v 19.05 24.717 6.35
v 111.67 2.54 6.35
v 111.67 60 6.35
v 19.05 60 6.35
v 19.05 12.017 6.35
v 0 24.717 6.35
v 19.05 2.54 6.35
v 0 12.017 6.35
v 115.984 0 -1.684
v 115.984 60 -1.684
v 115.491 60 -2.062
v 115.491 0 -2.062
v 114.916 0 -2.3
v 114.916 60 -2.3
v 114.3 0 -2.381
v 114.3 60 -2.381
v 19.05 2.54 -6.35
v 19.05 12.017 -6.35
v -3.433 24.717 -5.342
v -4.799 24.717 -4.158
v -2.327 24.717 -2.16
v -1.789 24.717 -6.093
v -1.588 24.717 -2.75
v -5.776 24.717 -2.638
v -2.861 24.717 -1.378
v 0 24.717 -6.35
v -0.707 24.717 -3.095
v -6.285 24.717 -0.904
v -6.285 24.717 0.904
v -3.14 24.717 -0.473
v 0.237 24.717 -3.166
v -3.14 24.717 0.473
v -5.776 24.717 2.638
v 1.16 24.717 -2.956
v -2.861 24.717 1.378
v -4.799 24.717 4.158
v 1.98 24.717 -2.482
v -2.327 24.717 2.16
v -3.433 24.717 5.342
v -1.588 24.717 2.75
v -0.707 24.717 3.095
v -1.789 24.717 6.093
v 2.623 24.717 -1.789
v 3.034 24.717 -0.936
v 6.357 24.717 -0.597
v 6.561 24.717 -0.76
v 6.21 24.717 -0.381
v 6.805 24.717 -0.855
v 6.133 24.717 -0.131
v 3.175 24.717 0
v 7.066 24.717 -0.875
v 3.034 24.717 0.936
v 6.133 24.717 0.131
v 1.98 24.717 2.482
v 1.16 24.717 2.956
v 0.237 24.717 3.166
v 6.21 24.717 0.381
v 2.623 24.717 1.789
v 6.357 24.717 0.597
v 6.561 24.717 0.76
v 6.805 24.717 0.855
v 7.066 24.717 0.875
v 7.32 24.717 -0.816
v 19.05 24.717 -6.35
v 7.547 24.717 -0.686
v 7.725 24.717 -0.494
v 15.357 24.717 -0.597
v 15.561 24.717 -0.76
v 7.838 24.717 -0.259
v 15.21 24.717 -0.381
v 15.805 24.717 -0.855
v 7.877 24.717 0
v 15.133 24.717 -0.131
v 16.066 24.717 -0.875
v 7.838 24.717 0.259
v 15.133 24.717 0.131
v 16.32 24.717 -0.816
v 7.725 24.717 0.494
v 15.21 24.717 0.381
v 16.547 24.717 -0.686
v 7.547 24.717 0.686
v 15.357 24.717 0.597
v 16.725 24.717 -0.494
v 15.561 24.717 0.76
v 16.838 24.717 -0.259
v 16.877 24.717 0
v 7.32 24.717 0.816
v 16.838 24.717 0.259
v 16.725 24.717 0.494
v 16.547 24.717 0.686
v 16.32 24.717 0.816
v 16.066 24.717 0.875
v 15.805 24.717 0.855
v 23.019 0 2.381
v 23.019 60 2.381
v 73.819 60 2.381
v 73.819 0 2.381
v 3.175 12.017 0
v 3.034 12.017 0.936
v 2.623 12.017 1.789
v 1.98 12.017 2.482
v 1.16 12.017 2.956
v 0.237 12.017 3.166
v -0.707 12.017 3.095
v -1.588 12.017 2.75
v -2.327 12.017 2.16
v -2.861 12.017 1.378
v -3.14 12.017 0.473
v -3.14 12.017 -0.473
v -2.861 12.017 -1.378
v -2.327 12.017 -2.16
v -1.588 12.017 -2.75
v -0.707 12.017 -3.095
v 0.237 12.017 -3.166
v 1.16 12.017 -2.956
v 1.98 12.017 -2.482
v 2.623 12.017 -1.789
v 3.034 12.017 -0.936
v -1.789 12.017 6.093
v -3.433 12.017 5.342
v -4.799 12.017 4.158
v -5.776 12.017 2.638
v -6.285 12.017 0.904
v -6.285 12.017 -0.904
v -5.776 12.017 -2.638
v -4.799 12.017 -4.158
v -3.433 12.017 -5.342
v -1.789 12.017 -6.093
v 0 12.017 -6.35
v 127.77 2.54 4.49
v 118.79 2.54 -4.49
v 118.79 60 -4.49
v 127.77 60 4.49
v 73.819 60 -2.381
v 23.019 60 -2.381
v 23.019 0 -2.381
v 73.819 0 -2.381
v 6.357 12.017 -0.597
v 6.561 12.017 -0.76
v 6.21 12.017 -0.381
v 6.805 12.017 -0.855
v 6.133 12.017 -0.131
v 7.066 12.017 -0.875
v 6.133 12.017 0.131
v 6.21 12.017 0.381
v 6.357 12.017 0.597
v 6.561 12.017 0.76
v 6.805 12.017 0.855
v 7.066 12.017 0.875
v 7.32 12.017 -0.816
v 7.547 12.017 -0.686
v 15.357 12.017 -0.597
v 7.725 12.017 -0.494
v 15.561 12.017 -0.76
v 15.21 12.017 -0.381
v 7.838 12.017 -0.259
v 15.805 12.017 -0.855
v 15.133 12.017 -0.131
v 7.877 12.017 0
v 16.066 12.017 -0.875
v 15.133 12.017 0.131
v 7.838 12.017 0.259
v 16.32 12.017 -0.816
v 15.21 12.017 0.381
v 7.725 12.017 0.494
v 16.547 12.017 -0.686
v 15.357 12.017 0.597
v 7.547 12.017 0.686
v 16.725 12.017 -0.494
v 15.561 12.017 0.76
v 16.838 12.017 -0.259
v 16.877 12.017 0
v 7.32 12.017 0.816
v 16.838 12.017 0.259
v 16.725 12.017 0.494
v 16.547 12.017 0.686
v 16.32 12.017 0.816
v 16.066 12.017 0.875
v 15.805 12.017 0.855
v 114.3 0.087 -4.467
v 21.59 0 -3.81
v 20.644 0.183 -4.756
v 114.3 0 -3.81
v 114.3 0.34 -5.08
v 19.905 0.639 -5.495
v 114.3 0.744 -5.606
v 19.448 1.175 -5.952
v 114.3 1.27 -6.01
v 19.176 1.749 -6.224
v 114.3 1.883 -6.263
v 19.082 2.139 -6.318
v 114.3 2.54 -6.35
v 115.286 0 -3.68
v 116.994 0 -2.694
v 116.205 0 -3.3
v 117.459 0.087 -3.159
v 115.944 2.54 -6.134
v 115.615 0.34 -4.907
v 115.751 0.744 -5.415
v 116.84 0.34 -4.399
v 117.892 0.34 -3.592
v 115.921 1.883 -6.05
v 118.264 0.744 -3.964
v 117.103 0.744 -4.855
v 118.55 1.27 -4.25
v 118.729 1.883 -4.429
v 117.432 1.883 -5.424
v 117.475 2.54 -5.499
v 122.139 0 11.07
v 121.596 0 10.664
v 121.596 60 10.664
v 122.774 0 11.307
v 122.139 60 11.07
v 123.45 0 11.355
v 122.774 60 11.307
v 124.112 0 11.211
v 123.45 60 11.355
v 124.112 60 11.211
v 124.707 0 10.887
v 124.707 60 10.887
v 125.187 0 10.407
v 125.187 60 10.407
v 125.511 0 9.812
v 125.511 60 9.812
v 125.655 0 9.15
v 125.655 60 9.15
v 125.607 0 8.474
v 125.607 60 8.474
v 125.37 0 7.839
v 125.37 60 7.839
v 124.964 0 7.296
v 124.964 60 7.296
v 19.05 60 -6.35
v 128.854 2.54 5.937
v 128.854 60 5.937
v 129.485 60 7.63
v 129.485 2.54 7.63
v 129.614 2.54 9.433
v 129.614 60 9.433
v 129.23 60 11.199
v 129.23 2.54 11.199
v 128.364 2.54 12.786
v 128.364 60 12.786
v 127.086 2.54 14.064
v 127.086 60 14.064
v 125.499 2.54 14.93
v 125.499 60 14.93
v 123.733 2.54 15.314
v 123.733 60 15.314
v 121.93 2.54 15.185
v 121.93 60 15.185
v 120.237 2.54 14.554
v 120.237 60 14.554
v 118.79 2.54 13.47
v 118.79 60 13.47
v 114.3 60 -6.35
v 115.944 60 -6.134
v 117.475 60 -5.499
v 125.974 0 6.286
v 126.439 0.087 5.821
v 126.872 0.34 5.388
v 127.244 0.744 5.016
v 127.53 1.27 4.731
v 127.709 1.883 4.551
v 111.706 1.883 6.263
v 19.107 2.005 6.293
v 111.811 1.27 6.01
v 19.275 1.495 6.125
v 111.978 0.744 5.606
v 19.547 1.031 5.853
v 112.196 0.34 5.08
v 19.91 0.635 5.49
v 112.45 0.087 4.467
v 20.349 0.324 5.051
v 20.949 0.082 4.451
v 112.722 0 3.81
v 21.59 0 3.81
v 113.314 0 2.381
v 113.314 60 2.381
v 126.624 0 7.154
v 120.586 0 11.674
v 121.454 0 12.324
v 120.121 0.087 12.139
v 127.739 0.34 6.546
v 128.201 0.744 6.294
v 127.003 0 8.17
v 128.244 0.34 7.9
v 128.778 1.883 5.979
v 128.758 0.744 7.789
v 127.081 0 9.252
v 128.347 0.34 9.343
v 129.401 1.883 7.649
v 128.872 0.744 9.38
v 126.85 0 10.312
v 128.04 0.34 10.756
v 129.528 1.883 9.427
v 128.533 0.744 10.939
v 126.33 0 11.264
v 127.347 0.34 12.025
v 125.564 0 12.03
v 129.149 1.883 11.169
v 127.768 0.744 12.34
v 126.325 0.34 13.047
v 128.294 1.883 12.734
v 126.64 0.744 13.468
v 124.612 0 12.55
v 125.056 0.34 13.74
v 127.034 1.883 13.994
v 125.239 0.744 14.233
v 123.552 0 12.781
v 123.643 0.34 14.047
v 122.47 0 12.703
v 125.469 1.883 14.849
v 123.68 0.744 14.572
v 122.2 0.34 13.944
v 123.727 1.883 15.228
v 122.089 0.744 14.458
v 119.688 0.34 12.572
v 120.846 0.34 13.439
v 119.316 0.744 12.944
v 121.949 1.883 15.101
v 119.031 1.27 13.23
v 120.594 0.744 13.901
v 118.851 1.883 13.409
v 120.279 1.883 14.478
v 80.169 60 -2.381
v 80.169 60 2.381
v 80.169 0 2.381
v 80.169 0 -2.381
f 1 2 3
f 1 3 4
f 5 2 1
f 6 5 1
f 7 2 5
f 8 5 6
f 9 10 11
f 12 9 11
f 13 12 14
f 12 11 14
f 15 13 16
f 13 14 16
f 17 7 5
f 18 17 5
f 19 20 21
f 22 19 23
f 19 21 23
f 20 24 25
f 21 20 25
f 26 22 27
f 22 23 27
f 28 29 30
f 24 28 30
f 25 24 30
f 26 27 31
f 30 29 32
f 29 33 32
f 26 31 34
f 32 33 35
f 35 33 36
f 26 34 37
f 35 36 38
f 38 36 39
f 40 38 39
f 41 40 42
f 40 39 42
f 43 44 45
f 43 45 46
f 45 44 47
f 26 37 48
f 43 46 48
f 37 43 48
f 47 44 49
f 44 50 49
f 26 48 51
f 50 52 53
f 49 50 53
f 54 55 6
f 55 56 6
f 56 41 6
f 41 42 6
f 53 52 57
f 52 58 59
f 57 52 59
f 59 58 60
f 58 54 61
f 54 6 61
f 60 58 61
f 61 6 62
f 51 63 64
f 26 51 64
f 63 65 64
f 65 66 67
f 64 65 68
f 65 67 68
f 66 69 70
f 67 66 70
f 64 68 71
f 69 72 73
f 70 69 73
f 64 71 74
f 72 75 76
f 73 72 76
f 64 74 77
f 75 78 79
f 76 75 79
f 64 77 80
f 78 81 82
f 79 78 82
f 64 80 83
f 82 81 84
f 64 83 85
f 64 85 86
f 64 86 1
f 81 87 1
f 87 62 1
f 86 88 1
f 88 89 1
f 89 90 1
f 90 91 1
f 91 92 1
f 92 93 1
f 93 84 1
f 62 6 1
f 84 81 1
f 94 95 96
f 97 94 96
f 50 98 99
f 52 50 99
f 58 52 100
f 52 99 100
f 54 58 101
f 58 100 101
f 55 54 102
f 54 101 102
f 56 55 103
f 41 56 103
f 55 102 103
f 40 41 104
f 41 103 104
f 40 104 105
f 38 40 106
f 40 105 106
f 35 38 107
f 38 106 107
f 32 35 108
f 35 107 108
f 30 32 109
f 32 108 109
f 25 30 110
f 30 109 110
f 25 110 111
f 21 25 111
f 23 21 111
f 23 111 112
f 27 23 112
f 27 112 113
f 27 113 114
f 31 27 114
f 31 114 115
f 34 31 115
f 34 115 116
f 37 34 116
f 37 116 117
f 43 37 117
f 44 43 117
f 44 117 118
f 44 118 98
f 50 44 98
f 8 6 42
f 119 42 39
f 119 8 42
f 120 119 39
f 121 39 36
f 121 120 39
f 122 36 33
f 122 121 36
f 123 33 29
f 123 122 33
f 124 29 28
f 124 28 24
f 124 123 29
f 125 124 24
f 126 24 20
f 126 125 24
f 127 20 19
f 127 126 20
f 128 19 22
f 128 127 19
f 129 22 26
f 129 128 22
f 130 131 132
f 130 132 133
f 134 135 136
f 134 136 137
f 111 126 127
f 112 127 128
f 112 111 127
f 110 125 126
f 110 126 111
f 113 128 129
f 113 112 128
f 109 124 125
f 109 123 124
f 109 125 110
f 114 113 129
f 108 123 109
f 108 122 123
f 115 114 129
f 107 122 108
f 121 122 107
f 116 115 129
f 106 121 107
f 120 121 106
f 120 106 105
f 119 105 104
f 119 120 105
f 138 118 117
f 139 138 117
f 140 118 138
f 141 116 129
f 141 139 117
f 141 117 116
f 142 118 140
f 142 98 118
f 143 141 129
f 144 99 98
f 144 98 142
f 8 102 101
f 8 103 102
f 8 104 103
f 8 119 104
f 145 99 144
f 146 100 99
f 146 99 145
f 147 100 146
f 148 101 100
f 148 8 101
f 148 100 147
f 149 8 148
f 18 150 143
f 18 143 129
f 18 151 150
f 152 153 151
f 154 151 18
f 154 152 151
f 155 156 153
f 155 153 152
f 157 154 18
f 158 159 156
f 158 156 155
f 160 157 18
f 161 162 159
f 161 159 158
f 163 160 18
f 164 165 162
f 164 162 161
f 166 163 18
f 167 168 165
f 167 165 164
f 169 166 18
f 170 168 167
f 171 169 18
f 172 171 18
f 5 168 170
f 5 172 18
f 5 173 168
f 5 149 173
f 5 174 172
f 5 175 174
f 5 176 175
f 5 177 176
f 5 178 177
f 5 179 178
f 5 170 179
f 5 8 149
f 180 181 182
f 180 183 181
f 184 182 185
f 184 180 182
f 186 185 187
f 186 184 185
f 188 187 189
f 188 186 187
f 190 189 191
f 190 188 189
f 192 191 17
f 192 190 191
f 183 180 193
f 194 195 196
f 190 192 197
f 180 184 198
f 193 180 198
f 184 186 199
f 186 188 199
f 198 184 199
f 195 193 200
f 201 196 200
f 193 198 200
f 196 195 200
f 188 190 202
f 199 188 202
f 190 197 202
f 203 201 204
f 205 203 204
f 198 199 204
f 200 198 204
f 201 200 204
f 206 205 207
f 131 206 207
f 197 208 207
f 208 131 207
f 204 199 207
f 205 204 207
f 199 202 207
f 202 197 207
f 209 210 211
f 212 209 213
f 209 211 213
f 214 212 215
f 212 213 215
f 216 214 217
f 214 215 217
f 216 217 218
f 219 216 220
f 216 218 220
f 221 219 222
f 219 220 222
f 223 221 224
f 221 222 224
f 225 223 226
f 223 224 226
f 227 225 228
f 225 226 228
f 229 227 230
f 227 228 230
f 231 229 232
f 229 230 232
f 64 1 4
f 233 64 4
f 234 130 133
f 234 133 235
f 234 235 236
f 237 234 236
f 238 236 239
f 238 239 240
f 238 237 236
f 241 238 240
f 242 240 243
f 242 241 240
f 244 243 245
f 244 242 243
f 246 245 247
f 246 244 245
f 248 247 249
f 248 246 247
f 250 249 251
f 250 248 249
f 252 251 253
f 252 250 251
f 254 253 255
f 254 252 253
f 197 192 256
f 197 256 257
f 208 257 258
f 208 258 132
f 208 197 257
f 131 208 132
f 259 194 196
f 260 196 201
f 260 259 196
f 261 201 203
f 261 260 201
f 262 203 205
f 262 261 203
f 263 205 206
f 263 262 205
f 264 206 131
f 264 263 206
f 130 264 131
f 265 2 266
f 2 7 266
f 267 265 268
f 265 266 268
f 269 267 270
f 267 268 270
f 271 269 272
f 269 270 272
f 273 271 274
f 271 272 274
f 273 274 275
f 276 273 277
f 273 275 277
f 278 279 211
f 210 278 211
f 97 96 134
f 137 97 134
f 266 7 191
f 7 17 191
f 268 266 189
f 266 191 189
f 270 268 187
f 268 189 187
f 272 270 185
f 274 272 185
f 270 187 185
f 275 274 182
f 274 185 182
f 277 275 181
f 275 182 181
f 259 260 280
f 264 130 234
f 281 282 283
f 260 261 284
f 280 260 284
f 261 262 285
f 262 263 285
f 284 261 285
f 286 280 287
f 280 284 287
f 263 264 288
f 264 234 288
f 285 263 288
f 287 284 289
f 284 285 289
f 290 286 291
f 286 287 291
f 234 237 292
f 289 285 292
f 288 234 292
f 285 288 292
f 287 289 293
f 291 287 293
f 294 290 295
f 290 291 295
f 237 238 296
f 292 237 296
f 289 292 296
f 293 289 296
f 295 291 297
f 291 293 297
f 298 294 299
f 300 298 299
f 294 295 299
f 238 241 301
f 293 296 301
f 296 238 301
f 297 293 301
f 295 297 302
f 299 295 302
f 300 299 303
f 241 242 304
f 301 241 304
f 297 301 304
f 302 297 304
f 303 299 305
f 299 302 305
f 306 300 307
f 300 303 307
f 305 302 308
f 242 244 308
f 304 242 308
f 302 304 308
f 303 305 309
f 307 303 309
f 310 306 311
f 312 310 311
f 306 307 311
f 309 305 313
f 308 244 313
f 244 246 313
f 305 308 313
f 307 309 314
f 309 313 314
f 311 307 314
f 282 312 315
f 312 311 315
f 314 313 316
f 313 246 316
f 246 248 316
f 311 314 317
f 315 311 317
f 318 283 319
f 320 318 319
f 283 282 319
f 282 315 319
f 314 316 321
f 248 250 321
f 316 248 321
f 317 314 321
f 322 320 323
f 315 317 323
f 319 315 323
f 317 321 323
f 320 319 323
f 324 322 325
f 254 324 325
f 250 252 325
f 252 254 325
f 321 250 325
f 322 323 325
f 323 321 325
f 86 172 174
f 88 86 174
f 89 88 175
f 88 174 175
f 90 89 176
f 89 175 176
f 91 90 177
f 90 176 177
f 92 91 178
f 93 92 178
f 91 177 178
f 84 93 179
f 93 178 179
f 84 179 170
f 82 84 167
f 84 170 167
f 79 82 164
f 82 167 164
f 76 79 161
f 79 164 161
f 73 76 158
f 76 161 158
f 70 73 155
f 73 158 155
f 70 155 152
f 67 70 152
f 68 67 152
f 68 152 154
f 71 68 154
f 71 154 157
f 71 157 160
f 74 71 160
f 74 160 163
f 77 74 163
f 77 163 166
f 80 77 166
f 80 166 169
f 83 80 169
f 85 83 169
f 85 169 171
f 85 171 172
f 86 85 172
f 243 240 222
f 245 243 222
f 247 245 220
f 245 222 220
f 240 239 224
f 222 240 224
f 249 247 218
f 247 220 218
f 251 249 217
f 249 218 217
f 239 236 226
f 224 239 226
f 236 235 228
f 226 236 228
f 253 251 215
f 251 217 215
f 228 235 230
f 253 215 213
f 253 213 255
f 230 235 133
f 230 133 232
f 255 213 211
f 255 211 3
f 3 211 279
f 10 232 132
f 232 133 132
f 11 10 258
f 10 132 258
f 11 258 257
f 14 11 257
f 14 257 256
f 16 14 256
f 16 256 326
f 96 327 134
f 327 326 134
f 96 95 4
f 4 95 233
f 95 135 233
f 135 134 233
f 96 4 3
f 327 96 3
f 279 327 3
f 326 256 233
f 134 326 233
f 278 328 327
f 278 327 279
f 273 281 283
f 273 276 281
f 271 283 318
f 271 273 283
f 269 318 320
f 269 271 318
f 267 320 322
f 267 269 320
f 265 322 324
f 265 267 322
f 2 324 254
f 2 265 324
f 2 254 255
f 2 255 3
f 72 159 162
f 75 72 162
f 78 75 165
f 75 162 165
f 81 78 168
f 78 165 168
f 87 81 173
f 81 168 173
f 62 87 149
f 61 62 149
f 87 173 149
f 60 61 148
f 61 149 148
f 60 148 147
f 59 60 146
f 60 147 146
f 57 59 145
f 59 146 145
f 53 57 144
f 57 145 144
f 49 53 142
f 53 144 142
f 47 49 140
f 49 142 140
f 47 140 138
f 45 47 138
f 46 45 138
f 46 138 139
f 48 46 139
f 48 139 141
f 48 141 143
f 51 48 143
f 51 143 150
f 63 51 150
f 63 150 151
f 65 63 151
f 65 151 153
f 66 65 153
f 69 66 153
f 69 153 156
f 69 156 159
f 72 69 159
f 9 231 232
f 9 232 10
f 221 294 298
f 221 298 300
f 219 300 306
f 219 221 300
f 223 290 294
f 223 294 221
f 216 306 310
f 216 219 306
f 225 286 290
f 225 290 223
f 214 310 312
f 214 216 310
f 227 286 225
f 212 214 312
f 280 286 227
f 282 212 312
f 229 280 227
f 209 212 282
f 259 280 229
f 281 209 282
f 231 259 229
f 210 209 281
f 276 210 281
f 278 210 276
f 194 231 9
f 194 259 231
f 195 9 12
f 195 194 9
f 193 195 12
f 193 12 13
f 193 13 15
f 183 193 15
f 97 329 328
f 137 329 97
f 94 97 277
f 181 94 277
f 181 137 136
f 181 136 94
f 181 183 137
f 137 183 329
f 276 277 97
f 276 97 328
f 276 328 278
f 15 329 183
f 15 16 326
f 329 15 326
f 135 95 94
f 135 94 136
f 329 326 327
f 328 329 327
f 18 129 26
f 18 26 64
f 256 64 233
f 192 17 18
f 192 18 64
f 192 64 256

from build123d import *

# Parameters (mm, degrees)
BOSS_EXTRUDE1_DEPTH = 59.999999888
SKETCH2_W           = 25.4
SKETCH2_H           = 12.017000096
SKETCH2_H_2         = 35.282999792
CUT_EXTRUDE1_DEPTH  = 13.7
SKETCH3_R           = 0.877000024
CUT_EXTRUDE2_DEPTH  = 48.982999792
SKETCH4_R           = 3.175
CUT_EXTRUDE3_DEPTH  = 48.982999792
SKETCH5_W           = 50.8
SKETCH5_H           = 4.7625
CUT_EXTRUDE4_DEPTH  = 60.999999888
FILLET1_R           = 2.54


with BuildPart() as part:
    # Sketch1 → Boss-Extrude1 (new body)
    with BuildSketch(Plane(origin=(0, 0, 0), x_dir=(1, 0, 0), z_dir=(0, 1, 0))):
        with BuildLine():
            Line((0, 6.35), (114.3, 6.35))
            ThreePointArc((114.3, 6.35), (120.65, 0), (114.3, -6.35))
            Line((114.3, -6.35), (0, -6.35))
            ThreePointArc((0, -6.35), (-6.35, 0), (0, 6.35))
        make_face()
        with BuildLine():
            Line((118.790128061, 4.490128061), (127.770384182, -4.490128061))
            ThreePointArc((127.770384182, -4.490128061), (127.770384182, -13.470384182), (118.790128061, -13.470384182))
            Line((118.790128061, -13.470384182), (109.809871939, -4.490128061))
            ThreePointArc((109.809871939, -4.490128061), (109.809871939, 4.490128061), (118.790128061, 4.490128061))
        make_face()
    extrude(amount=BOSS_EXTRUDE1_DEPTH)

    # Sketch2 → Cut-Extrude1 (cut, through all)
    with BuildSketch(Plane.XY.offset(6.35)):
        with Locations((6.35, 6.008500048)):
            Rectangle(SKETCH2_W, SKETCH2_H)
        with Locations((6.35, 42.358499992)):
            Rectangle(SKETCH2_W, SKETCH2_H_2)
    extrude(amount=-CUT_EXTRUDE1_DEPTH, mode=Mode.SUBTRACT)

    # Sketch3 → Cut-Extrude2 (cut, through all)
    with BuildSketch(Plane.XZ.offset(-12.017000096)):
        with Locations((6.99999997, 0)):
            Circle(SKETCH3_R)
        with Locations((16.000000004, 0)):
            Circle(SKETCH3_R)
    extrude(amount=-CUT_EXTRUDE2_DEPTH, mode=Mode.SUBTRACT)

    # Sketch4 → Cut-Extrude3 (cut, through all)
    with BuildSketch(Plane.XZ.offset(-12.017000096)):
        Circle(SKETCH4_R)
    extrude(amount=-CUT_EXTRUDE3_DEPTH, mode=Mode.SUBTRACT)

    # Sketch5 → Cut-Extrude4 (cut, through all)
    with BuildSketch(Plane(origin=(0, 59.999999888, 0), x_dir=(1, 0, 0), z_dir=(0, 1, 0))):
        with Locations((48.41875, 0)):
            Rectangle(SKETCH5_W, SKETCH5_H)
        with BuildLine():
            Line((80.16875, 2.38125), (80.16875, -2.38125))
            Line((80.16875, -2.38125), (113.313653955, -2.38125))
            Line((113.313653955, -2.38125), (121.596458098, -10.664054144))
            ThreePointArc((121.596458098, -10.664054144), (124.964054144, -10.664054144), (124.964054144, -7.296458098))
            Line((124.964054144, -7.296458098), (115.983798023, 1.683798023))
            ThreePointArc((115.983798023, 1.683798023), (115.211264923, 2.199988137), (114.3, 2.38125))
            Line((114.3, 2.38125), (80.16875, 2.38125))
        make_face()
    extrude(amount=-CUT_EXTRUDE4_DEPTH, mode=Mode.SUBTRACT)

    # Fillet1
    fillet1_edges = [part.edges().sort_by_distance(p)[0] for p in [
        (116.730039796, 0, -5.866635031),
        (123.280256121, 0, 0),
        (65.359871939, 0, 6.35),
        (66.675, 0, -6.35),
        (19.05, 0, 0),
        (127.770384182, 0, 13.470384182),
        (115.22993597, 0, 9.910192091),
    ]]
    fillet(fillet1_edges, radius=FILLET1_R)


solid = part.part
